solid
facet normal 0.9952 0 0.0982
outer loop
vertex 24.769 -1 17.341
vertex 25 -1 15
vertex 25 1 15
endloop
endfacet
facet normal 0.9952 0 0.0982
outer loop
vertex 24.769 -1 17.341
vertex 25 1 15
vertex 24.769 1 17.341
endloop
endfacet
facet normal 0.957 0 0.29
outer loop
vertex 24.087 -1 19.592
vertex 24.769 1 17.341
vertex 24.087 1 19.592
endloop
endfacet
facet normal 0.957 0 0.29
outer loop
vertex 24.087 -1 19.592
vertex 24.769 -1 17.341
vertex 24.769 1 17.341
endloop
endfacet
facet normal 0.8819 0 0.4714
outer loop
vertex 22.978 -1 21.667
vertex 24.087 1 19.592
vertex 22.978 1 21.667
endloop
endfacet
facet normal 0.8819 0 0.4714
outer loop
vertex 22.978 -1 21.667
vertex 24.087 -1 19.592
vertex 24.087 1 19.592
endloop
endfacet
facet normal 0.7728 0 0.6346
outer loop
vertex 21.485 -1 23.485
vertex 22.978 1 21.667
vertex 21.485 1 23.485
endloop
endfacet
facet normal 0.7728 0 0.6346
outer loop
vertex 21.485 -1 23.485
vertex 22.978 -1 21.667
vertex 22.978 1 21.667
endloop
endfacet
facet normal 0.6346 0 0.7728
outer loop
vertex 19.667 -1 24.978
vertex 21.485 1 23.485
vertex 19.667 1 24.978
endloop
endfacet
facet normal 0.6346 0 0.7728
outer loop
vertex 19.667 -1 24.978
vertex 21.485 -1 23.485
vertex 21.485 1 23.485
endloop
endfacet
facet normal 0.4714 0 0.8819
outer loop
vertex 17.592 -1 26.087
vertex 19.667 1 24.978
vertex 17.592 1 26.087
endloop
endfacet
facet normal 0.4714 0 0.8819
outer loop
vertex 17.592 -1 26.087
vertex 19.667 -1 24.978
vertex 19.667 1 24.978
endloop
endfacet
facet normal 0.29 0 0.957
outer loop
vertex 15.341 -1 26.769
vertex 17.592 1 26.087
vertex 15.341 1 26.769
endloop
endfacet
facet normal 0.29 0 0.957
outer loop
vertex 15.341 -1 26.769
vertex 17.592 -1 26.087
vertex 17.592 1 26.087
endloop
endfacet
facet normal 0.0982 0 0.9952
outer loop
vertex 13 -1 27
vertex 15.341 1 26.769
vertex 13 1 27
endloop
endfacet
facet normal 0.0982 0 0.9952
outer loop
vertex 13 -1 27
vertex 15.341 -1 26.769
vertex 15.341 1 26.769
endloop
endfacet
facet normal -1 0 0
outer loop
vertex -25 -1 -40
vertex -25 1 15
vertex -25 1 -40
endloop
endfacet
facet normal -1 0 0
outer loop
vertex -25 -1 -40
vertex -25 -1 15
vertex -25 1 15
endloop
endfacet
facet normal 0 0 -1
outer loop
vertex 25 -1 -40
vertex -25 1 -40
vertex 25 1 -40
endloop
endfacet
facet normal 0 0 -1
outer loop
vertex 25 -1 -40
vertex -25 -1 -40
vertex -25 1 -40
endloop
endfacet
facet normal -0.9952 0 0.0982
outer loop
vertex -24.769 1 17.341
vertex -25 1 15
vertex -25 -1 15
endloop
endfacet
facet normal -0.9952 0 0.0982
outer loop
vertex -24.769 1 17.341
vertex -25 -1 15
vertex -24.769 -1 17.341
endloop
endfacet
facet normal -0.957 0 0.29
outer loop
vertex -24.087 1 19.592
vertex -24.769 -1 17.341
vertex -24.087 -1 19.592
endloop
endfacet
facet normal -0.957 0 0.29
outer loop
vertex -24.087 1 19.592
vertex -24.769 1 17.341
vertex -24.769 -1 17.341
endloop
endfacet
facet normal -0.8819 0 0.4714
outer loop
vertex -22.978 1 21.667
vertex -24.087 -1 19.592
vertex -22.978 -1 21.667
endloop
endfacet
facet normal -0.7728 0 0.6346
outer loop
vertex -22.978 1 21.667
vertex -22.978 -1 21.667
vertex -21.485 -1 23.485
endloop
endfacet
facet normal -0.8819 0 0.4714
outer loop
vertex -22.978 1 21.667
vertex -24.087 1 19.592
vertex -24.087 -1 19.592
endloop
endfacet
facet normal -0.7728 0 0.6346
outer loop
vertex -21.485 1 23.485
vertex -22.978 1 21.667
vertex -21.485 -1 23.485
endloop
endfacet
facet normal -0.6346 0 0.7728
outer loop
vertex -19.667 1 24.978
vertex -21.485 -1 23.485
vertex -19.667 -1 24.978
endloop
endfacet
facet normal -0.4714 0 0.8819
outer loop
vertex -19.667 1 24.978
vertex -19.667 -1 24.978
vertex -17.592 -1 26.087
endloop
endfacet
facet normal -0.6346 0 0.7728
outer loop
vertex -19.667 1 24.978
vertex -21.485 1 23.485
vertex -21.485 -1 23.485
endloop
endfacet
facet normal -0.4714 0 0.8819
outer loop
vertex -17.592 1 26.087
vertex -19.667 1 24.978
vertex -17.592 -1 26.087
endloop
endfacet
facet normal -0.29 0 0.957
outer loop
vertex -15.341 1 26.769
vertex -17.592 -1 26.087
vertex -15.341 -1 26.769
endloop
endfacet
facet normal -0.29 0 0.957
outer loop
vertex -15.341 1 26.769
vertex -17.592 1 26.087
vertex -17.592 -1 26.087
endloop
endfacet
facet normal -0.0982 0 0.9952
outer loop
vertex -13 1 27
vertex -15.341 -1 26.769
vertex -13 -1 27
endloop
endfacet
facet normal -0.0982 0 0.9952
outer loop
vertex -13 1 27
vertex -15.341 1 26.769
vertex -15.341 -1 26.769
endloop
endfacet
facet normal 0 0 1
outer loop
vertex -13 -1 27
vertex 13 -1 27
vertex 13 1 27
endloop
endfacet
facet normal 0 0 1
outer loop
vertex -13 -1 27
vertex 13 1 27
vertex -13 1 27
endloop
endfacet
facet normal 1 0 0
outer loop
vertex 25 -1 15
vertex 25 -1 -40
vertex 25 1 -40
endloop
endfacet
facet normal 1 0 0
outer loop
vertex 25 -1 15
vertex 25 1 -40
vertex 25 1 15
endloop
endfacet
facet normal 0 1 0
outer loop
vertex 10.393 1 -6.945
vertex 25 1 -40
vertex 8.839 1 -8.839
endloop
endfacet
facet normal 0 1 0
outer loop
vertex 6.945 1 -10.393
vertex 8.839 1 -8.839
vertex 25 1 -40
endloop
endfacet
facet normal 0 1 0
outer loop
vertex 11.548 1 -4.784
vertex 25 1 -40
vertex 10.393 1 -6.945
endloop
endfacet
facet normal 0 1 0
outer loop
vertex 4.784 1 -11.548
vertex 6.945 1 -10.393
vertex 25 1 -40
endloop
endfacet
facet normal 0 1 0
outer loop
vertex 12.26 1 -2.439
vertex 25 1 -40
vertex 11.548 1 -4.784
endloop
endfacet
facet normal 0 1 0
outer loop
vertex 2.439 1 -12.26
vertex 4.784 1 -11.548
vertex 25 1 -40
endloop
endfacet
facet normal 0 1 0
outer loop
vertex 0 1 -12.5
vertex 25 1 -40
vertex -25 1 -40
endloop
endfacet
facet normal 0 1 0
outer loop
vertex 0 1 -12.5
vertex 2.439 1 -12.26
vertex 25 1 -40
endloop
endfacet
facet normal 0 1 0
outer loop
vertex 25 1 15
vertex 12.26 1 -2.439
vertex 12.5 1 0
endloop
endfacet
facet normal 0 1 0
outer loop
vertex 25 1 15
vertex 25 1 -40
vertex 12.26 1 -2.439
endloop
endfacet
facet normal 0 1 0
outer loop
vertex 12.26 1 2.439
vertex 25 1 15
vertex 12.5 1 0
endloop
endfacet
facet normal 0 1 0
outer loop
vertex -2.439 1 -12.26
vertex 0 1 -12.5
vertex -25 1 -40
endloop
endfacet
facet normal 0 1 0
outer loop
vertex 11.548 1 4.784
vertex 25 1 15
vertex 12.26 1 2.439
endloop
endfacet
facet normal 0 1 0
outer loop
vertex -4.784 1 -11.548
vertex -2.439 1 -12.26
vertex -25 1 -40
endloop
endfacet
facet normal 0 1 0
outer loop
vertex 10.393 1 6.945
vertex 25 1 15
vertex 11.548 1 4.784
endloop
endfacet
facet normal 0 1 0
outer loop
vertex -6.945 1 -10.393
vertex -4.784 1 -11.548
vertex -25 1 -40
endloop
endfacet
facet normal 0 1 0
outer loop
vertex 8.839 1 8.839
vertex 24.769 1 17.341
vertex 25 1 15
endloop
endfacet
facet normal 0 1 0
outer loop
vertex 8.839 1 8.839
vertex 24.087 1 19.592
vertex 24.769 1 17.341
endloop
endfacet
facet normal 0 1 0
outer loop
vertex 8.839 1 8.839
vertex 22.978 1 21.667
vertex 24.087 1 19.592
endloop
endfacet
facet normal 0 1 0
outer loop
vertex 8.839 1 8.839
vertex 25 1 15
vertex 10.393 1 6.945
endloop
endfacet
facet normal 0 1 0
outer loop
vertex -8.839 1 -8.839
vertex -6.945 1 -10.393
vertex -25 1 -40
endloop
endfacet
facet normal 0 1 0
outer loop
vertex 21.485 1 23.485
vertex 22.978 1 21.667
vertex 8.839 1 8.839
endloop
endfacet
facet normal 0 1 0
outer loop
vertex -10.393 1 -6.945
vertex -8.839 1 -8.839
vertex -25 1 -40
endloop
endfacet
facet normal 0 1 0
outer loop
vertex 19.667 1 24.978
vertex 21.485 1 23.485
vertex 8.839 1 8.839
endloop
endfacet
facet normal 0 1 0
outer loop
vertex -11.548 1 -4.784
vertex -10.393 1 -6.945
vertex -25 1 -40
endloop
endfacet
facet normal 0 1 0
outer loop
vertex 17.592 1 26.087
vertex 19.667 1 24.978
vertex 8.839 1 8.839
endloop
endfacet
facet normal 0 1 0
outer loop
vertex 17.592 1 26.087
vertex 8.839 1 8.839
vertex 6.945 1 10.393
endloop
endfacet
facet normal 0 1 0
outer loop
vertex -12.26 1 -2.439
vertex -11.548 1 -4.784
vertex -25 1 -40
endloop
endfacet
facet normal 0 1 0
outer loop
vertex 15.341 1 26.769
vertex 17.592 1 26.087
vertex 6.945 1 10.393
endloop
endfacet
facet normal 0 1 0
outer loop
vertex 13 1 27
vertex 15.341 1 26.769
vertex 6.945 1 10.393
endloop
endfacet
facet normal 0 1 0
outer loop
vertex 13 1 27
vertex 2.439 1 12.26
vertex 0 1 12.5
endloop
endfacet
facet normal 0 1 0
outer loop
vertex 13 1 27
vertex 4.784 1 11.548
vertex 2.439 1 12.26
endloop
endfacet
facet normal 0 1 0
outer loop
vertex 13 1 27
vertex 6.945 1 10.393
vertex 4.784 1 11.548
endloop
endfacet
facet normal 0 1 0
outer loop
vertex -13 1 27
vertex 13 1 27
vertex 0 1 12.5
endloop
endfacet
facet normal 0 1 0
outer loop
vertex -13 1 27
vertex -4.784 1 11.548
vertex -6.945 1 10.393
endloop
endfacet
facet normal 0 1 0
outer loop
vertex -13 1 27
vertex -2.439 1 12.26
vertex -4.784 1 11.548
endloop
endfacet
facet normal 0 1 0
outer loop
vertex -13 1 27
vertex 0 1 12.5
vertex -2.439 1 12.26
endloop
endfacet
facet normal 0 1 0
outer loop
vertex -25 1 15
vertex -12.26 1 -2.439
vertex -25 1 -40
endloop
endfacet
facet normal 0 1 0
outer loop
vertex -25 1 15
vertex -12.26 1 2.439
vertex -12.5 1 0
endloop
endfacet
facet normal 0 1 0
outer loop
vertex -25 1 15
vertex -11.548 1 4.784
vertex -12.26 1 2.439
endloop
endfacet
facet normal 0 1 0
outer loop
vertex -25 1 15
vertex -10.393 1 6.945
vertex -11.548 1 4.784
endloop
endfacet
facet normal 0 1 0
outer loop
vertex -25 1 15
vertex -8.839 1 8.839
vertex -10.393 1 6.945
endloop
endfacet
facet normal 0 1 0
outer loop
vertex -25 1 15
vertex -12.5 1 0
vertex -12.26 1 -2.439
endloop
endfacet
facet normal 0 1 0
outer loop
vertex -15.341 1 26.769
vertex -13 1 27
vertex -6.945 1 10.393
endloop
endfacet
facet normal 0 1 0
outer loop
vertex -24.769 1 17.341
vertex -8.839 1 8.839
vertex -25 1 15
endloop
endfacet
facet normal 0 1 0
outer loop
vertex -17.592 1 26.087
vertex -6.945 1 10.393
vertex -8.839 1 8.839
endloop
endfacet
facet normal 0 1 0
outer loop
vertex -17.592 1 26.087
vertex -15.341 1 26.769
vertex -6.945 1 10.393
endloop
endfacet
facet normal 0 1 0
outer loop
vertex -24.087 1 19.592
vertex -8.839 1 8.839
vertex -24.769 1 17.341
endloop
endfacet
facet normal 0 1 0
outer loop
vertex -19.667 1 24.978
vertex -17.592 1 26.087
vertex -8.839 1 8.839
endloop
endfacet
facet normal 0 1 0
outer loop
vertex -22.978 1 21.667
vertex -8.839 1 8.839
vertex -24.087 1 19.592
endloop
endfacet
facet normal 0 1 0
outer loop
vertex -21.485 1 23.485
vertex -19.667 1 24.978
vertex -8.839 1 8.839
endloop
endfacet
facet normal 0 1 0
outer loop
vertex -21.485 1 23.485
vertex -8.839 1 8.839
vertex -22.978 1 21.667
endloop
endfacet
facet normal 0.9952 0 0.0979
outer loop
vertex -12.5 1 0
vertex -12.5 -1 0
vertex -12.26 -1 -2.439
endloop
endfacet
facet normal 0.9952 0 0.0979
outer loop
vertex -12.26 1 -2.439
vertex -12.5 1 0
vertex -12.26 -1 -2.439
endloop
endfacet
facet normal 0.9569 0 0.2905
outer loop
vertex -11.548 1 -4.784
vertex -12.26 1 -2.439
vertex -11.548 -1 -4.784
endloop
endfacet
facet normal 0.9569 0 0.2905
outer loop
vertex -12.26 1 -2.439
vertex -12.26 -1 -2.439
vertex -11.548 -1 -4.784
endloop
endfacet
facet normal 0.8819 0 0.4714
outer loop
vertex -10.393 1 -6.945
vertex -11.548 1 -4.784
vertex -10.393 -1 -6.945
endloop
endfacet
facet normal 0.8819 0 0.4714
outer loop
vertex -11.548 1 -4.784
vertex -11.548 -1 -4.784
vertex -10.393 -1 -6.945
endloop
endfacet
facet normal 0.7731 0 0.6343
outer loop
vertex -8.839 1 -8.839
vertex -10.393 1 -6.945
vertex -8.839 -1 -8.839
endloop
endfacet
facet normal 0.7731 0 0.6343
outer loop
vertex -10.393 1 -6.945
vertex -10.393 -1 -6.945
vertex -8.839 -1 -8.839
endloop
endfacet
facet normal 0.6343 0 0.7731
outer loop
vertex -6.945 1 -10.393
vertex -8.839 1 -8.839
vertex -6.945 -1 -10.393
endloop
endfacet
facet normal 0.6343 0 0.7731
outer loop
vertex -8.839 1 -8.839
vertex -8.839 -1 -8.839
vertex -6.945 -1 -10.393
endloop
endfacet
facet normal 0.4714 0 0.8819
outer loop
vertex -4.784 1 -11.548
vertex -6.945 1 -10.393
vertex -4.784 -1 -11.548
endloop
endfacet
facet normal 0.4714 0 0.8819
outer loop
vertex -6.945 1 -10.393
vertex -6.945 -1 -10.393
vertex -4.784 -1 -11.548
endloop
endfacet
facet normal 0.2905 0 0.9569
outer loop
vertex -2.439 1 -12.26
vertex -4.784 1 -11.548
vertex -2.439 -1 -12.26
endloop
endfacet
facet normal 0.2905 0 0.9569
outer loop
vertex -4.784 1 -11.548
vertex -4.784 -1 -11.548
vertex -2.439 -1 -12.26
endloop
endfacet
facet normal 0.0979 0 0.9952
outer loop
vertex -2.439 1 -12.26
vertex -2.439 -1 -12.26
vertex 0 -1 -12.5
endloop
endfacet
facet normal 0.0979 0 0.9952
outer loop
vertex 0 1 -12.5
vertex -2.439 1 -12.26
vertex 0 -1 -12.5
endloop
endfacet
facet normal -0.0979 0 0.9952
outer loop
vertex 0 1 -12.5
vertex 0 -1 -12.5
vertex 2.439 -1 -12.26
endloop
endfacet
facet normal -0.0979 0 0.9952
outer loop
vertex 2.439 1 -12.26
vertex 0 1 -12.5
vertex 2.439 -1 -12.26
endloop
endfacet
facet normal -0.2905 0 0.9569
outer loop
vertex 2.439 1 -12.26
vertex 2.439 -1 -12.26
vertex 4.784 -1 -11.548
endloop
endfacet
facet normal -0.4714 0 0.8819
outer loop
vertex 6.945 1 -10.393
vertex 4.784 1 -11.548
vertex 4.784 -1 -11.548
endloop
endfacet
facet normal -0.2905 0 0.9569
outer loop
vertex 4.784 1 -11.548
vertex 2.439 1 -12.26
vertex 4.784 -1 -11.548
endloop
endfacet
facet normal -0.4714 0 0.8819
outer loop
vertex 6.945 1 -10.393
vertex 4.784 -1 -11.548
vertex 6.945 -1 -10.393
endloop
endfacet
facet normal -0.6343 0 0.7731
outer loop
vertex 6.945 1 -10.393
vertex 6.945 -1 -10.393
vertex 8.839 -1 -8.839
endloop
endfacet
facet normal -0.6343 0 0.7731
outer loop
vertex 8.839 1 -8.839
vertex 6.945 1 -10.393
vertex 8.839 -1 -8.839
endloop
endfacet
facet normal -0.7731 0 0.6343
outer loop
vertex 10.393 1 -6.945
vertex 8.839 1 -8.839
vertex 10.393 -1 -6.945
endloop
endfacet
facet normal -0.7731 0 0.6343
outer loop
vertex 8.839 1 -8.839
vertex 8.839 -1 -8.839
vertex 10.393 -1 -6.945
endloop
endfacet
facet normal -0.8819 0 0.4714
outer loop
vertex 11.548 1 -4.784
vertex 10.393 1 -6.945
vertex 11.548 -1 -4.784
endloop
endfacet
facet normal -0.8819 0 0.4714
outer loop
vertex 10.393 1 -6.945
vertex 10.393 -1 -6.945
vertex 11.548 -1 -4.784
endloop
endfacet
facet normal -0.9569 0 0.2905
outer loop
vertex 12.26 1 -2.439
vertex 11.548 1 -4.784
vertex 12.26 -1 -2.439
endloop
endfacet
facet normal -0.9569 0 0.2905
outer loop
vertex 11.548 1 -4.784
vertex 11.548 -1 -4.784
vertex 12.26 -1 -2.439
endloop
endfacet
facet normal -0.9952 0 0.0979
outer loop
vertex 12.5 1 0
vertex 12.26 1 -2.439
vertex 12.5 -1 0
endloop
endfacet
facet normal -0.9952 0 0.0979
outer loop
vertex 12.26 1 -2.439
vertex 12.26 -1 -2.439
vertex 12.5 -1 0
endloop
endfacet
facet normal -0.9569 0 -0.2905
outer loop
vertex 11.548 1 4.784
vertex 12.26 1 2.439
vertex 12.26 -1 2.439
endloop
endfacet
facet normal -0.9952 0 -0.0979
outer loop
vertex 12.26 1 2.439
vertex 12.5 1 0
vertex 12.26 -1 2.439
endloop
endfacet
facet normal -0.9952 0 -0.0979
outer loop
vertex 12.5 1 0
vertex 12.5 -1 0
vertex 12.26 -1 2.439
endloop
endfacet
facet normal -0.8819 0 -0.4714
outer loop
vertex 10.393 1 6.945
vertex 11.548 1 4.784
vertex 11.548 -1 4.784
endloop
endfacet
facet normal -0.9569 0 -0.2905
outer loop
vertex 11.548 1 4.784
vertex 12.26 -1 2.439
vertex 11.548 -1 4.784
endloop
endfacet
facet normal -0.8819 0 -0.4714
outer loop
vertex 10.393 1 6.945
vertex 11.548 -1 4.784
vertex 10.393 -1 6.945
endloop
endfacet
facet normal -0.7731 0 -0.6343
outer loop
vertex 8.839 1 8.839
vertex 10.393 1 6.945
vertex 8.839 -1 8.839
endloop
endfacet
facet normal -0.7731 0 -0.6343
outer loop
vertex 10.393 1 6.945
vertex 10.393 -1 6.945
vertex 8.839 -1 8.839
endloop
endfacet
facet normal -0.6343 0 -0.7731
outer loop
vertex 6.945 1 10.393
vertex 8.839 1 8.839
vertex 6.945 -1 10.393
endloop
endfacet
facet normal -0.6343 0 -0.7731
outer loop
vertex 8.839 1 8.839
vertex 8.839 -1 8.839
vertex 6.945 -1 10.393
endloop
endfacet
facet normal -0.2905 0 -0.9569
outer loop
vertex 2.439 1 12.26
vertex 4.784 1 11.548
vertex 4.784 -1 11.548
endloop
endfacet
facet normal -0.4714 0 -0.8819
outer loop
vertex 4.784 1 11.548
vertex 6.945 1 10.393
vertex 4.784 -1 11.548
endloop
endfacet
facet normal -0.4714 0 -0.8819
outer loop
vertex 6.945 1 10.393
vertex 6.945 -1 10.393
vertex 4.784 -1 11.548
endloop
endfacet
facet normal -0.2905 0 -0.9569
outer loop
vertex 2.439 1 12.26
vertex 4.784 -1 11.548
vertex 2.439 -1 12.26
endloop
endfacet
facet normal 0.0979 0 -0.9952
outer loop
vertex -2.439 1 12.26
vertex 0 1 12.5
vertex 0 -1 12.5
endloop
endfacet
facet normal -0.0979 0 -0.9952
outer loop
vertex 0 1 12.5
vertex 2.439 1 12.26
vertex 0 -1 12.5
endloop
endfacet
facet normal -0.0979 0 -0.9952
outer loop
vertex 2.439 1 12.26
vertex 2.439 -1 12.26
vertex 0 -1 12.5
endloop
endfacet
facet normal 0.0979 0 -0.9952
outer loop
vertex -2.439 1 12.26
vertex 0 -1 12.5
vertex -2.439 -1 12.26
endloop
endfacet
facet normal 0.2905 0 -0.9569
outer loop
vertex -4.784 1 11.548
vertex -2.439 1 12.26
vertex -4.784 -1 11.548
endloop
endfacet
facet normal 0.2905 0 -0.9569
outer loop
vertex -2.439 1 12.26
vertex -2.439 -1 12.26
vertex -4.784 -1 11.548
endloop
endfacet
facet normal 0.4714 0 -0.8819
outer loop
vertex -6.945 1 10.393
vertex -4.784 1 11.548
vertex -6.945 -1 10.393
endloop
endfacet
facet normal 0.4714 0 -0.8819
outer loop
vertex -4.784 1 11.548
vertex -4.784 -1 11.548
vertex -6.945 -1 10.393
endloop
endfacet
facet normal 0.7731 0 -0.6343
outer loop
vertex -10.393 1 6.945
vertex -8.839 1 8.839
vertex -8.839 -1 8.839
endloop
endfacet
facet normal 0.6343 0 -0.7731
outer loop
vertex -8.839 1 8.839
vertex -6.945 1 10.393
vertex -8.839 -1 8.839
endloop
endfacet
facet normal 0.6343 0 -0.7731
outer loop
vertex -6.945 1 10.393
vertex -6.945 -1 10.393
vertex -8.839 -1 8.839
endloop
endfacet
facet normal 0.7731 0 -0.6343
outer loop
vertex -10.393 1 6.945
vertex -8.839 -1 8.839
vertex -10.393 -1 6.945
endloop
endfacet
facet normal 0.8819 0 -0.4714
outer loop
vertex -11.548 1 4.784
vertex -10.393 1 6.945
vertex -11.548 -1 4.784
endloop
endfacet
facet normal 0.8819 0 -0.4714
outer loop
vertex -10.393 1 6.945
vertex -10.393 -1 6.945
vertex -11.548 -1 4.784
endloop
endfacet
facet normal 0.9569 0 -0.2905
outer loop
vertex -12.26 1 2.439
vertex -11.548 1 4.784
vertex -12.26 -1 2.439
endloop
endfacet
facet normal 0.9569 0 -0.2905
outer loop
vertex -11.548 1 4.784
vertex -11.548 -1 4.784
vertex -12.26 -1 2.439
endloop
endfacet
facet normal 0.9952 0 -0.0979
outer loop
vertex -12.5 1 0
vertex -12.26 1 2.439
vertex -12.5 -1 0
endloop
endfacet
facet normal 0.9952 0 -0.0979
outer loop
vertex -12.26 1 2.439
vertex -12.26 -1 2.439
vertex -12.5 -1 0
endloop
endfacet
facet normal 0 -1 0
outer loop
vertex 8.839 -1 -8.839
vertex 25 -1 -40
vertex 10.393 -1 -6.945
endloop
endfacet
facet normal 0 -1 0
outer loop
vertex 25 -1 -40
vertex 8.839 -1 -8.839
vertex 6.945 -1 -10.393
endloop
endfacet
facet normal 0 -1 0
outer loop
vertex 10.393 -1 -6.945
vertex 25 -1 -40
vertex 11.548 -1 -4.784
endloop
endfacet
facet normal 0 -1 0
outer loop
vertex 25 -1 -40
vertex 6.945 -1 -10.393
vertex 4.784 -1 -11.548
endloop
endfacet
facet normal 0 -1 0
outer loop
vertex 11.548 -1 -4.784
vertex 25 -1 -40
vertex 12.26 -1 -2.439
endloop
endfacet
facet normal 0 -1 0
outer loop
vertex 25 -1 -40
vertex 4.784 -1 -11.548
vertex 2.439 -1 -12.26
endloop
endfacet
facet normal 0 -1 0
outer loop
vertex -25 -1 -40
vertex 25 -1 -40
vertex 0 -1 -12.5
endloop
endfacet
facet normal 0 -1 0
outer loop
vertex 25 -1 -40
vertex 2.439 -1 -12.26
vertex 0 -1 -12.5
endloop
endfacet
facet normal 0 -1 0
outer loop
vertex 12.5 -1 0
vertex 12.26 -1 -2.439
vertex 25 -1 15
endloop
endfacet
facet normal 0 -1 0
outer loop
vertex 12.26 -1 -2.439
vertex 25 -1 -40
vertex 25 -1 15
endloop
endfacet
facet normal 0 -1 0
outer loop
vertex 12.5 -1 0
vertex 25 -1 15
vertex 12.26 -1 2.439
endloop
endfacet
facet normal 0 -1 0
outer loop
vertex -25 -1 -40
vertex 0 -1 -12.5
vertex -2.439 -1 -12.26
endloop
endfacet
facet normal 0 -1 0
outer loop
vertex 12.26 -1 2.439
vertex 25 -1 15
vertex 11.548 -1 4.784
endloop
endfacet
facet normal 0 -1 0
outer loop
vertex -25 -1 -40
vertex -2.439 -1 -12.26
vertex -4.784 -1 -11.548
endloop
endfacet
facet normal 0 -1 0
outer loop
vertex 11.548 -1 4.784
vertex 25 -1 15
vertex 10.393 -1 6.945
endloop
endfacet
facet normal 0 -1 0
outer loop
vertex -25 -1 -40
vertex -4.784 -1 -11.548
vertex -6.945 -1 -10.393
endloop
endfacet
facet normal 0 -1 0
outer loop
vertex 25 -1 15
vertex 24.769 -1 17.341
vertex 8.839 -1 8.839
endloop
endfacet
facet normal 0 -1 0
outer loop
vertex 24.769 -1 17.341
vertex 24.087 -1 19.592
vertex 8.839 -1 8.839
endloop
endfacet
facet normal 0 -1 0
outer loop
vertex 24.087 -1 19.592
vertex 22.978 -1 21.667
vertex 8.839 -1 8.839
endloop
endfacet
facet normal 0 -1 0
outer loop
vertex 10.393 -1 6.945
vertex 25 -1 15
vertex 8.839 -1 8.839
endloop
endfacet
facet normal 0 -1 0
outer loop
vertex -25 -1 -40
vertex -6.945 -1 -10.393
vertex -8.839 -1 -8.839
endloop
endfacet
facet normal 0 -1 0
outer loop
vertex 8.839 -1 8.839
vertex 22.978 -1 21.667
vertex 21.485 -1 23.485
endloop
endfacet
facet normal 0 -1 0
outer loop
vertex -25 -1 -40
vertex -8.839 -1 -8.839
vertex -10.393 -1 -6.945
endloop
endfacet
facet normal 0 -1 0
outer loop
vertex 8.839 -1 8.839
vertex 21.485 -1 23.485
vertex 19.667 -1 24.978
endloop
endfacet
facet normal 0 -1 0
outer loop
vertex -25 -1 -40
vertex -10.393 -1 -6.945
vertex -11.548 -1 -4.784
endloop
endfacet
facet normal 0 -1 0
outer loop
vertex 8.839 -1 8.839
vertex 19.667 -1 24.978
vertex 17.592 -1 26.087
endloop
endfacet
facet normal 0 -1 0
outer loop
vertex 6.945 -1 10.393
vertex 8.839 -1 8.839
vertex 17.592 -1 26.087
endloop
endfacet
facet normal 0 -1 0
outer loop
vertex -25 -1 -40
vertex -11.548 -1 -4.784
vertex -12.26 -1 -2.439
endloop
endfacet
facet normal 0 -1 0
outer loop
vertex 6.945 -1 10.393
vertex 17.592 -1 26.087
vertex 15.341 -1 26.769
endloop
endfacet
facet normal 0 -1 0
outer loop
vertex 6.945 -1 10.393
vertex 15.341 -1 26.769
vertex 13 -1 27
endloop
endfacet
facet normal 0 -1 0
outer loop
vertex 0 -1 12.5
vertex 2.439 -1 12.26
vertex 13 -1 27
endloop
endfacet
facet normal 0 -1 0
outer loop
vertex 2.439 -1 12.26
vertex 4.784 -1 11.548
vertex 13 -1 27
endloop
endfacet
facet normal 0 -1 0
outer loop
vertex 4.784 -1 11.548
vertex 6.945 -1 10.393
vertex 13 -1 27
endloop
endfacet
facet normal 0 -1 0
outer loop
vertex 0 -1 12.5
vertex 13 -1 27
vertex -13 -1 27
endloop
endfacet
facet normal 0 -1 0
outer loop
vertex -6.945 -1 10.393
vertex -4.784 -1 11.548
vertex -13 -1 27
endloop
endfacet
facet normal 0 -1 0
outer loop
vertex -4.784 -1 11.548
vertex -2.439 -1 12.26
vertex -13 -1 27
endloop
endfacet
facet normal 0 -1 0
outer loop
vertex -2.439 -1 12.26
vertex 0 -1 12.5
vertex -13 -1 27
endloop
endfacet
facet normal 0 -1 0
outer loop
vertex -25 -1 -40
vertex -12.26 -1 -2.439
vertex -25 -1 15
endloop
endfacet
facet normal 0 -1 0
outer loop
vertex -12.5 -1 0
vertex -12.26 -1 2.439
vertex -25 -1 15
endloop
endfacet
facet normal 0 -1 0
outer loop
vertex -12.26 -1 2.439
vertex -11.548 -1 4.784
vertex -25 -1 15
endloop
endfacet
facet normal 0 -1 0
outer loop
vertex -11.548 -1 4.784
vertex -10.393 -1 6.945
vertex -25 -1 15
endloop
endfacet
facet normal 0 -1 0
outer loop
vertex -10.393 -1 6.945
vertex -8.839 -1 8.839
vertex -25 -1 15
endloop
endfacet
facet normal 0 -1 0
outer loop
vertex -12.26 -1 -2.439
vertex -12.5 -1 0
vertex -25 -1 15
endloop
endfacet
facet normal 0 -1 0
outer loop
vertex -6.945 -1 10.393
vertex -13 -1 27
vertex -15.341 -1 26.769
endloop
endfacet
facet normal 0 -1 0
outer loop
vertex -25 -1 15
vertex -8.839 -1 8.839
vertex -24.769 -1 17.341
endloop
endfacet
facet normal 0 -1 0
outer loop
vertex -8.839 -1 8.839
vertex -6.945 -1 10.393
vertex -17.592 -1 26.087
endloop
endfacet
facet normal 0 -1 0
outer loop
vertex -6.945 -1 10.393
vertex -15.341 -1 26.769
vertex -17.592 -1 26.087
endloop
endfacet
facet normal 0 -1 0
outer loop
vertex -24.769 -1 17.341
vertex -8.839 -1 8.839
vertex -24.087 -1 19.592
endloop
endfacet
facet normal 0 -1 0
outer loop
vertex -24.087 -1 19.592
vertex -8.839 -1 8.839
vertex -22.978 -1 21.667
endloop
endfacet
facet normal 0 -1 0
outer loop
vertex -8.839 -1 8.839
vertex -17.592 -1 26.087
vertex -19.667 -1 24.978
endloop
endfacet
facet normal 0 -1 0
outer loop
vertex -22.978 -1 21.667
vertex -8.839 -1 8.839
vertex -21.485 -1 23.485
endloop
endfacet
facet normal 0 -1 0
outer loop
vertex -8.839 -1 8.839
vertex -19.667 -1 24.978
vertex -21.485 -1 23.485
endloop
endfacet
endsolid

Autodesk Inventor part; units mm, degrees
ref_plane "YZ Plane" through (0, 0, 0) normal (1, 0, 0) x (0, 1, 0)
ref_plane "XZ Plane" through (0, 0, 0) normal (0, 1, 0) x (-1, 0, 0)
ref_plane "XY Plane" through (0, 0, 0) normal (0, 0, 1) x (1, 0, 0)
sketch "Sketch1" plane through (0, 0, 0) normal (0, 1, 0) x (-1, 0, 0)
  circle A0 centre (0, 0) radius 12.5
  line L0 (25, -40) -> (-25, -40)
  line L1 (-25, -40) -> (-25, 27)
  line L2 (-25, 27) -> (25, 27)
  line L3 (25, 27) -> (25, -40)
  point P0 (0, -40)
  dimension "d0" = 25
  dimension "d1" = 50
  dimension "d2" = 67
  dimension "d3" = 40
extrude "Extrusion1" add sketch "Sketch1" along normal mid plane 2
fillet "Fillet1" radius 12 2 edges at (25, 0, 27) (-25, 0, 27)
properties part number "bracket"
